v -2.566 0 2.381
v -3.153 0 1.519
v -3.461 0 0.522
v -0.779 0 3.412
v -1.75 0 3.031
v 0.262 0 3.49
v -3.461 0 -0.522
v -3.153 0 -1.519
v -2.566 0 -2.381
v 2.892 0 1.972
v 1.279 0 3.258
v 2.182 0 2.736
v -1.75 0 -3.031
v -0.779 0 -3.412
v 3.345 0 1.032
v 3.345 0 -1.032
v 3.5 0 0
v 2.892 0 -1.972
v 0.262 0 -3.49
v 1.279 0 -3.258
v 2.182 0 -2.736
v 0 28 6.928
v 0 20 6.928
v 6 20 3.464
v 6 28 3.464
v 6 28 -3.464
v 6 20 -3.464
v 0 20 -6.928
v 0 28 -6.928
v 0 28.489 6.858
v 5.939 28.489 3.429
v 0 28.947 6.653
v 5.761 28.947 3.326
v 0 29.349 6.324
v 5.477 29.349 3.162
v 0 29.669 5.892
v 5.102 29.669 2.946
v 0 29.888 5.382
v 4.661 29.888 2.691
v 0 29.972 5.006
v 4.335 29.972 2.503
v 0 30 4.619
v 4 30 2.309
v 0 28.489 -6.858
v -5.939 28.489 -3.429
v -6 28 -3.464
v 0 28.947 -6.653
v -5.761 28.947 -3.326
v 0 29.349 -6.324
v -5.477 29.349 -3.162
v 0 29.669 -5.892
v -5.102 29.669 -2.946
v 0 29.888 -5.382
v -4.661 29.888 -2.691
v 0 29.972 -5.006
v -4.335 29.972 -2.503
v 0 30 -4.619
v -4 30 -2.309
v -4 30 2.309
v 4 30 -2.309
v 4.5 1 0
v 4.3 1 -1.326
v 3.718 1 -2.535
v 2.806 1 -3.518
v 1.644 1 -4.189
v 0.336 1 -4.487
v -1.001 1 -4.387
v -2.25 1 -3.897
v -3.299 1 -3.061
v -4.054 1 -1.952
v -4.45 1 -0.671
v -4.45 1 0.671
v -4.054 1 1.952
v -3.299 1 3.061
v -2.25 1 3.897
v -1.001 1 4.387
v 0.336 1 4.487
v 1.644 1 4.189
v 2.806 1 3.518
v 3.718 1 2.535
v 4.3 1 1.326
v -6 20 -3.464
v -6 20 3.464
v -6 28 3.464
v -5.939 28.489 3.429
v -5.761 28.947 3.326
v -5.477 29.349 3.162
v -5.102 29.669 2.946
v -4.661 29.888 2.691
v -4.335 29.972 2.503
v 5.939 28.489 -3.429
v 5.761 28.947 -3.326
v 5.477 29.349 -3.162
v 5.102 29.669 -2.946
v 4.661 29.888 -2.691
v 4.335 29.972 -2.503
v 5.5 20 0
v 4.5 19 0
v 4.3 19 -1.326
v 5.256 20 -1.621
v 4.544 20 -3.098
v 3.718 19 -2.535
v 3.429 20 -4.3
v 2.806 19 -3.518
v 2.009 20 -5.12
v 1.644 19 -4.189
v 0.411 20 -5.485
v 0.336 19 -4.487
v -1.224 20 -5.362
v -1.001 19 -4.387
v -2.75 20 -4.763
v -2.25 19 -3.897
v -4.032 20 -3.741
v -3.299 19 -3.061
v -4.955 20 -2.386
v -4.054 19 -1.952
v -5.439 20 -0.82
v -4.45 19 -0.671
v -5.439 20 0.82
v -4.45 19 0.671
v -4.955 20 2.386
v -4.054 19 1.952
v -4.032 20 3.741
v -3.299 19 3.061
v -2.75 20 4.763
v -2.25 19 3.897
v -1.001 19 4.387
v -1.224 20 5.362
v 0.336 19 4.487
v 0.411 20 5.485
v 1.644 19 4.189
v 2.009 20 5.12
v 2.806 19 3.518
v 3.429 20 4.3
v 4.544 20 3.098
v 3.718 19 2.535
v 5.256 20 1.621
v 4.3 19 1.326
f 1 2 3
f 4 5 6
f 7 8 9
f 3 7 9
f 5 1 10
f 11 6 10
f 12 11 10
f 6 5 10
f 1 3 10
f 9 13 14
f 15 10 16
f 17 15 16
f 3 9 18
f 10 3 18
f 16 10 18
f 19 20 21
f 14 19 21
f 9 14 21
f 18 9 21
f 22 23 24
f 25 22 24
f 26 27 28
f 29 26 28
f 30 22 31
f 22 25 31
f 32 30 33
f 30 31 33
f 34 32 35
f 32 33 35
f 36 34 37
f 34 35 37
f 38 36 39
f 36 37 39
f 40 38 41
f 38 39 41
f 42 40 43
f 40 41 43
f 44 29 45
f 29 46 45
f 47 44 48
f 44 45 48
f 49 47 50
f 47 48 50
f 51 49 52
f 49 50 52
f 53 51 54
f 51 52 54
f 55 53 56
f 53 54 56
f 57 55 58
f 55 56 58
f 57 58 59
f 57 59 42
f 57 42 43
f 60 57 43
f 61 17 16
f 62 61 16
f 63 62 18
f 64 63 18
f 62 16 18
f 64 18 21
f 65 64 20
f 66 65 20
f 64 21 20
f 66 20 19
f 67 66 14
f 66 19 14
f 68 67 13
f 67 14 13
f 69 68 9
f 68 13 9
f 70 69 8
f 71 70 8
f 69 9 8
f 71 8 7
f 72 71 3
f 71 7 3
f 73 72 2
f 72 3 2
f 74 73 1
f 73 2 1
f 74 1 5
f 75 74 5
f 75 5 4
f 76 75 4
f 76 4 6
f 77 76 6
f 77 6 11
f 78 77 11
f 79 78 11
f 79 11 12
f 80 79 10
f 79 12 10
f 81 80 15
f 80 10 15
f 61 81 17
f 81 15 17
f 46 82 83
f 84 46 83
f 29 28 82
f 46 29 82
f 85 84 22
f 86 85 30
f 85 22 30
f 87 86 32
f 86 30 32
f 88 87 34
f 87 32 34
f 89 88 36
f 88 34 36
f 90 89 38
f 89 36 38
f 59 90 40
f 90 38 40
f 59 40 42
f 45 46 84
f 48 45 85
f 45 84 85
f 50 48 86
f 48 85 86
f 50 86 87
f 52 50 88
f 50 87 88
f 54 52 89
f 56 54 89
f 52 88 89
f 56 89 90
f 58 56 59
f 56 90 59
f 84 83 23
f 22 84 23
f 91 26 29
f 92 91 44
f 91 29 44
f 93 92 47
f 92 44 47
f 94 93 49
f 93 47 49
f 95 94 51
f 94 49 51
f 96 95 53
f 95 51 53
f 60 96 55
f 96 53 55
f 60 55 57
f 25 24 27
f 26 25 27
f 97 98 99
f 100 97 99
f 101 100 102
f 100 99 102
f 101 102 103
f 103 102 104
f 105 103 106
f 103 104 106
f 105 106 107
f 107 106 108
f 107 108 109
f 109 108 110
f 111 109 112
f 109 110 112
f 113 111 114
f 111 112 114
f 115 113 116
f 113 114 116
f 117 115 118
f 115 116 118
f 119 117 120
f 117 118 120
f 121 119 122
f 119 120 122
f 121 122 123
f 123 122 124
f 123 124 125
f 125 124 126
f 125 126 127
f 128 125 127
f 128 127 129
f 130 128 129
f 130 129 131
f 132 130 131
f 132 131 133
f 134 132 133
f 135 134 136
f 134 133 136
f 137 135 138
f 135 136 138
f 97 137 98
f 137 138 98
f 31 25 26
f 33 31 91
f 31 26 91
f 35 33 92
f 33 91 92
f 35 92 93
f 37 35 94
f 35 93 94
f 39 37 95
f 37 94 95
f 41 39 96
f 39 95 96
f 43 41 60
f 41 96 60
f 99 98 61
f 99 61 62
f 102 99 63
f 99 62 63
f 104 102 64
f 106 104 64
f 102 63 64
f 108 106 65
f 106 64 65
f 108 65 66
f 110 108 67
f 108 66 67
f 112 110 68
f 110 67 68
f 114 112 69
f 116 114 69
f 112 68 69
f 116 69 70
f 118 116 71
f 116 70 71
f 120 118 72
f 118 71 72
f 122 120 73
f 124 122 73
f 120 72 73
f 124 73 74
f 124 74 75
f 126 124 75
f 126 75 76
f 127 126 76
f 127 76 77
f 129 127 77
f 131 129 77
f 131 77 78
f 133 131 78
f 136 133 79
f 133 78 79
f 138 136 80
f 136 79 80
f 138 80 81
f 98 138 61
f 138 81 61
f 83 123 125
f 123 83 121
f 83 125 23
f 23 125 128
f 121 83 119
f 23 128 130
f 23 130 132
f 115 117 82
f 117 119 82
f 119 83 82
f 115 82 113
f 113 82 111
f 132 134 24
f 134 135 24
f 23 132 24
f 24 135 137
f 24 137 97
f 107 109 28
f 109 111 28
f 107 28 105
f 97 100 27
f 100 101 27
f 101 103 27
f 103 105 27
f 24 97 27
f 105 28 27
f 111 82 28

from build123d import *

# Parameters (mm, degrees)
SKETCH_1_R      = 4.5
EXTRUDE_1_DEPTH = 20
EXTRUDE_2_DEPTH = 10
CHAMFER_2_SIZE  = 1
FILLET_1_R      = 2


with BuildPart() as part:
    # 草圖1 → 填料-伸長1 (new body)
    with BuildSketch(Plane(origin=(0, 0, 0), x_dir=(1, 0, 0), z_dir=(0, 1, 0))):
        Circle(SKETCH_1_R)
    extrude(amount=EXTRUDE_1_DEPTH)

    # 草圖2 → 填料-伸長2 (add)
    with BuildSketch(Plane(origin=(0, 20, 0), x_dir=(1, 0, 0), z_dir=(0, 1, 0))):
        Polygon((6, 3.464101615), (0, 6.92820323), (-6, 3.464101615), (-6, -3.464101615), (0, -6.92820323), (6, -3.464101615), align=None)
    extrude(amount=EXTRUDE_2_DEPTH)

    # 導角2
    chamfer_2_edges = [part.edges().sort_by_distance(p)[0] for p in [
        (-4.5, 0, 0),
        (-4.5, 20, 0),
    ]]
    chamfer(chamfer_2_edges, length=CHAMFER_2_SIZE)

    # 圓角1
    fillet_1_edges = [part.edges().sort_by_distance(p)[0] for p in [
        (6, 30, 0),
        (3, 30, -5.196152423),
        (-3, 30, -5.196152423),
        (-6, 30, 0),
        (-3, 30, 5.196152423),
        (3, 30, 5.196152423),
    ]]
    fillet(fillet_1_edges, radius=FILLET_1_R)


solid = part.part
